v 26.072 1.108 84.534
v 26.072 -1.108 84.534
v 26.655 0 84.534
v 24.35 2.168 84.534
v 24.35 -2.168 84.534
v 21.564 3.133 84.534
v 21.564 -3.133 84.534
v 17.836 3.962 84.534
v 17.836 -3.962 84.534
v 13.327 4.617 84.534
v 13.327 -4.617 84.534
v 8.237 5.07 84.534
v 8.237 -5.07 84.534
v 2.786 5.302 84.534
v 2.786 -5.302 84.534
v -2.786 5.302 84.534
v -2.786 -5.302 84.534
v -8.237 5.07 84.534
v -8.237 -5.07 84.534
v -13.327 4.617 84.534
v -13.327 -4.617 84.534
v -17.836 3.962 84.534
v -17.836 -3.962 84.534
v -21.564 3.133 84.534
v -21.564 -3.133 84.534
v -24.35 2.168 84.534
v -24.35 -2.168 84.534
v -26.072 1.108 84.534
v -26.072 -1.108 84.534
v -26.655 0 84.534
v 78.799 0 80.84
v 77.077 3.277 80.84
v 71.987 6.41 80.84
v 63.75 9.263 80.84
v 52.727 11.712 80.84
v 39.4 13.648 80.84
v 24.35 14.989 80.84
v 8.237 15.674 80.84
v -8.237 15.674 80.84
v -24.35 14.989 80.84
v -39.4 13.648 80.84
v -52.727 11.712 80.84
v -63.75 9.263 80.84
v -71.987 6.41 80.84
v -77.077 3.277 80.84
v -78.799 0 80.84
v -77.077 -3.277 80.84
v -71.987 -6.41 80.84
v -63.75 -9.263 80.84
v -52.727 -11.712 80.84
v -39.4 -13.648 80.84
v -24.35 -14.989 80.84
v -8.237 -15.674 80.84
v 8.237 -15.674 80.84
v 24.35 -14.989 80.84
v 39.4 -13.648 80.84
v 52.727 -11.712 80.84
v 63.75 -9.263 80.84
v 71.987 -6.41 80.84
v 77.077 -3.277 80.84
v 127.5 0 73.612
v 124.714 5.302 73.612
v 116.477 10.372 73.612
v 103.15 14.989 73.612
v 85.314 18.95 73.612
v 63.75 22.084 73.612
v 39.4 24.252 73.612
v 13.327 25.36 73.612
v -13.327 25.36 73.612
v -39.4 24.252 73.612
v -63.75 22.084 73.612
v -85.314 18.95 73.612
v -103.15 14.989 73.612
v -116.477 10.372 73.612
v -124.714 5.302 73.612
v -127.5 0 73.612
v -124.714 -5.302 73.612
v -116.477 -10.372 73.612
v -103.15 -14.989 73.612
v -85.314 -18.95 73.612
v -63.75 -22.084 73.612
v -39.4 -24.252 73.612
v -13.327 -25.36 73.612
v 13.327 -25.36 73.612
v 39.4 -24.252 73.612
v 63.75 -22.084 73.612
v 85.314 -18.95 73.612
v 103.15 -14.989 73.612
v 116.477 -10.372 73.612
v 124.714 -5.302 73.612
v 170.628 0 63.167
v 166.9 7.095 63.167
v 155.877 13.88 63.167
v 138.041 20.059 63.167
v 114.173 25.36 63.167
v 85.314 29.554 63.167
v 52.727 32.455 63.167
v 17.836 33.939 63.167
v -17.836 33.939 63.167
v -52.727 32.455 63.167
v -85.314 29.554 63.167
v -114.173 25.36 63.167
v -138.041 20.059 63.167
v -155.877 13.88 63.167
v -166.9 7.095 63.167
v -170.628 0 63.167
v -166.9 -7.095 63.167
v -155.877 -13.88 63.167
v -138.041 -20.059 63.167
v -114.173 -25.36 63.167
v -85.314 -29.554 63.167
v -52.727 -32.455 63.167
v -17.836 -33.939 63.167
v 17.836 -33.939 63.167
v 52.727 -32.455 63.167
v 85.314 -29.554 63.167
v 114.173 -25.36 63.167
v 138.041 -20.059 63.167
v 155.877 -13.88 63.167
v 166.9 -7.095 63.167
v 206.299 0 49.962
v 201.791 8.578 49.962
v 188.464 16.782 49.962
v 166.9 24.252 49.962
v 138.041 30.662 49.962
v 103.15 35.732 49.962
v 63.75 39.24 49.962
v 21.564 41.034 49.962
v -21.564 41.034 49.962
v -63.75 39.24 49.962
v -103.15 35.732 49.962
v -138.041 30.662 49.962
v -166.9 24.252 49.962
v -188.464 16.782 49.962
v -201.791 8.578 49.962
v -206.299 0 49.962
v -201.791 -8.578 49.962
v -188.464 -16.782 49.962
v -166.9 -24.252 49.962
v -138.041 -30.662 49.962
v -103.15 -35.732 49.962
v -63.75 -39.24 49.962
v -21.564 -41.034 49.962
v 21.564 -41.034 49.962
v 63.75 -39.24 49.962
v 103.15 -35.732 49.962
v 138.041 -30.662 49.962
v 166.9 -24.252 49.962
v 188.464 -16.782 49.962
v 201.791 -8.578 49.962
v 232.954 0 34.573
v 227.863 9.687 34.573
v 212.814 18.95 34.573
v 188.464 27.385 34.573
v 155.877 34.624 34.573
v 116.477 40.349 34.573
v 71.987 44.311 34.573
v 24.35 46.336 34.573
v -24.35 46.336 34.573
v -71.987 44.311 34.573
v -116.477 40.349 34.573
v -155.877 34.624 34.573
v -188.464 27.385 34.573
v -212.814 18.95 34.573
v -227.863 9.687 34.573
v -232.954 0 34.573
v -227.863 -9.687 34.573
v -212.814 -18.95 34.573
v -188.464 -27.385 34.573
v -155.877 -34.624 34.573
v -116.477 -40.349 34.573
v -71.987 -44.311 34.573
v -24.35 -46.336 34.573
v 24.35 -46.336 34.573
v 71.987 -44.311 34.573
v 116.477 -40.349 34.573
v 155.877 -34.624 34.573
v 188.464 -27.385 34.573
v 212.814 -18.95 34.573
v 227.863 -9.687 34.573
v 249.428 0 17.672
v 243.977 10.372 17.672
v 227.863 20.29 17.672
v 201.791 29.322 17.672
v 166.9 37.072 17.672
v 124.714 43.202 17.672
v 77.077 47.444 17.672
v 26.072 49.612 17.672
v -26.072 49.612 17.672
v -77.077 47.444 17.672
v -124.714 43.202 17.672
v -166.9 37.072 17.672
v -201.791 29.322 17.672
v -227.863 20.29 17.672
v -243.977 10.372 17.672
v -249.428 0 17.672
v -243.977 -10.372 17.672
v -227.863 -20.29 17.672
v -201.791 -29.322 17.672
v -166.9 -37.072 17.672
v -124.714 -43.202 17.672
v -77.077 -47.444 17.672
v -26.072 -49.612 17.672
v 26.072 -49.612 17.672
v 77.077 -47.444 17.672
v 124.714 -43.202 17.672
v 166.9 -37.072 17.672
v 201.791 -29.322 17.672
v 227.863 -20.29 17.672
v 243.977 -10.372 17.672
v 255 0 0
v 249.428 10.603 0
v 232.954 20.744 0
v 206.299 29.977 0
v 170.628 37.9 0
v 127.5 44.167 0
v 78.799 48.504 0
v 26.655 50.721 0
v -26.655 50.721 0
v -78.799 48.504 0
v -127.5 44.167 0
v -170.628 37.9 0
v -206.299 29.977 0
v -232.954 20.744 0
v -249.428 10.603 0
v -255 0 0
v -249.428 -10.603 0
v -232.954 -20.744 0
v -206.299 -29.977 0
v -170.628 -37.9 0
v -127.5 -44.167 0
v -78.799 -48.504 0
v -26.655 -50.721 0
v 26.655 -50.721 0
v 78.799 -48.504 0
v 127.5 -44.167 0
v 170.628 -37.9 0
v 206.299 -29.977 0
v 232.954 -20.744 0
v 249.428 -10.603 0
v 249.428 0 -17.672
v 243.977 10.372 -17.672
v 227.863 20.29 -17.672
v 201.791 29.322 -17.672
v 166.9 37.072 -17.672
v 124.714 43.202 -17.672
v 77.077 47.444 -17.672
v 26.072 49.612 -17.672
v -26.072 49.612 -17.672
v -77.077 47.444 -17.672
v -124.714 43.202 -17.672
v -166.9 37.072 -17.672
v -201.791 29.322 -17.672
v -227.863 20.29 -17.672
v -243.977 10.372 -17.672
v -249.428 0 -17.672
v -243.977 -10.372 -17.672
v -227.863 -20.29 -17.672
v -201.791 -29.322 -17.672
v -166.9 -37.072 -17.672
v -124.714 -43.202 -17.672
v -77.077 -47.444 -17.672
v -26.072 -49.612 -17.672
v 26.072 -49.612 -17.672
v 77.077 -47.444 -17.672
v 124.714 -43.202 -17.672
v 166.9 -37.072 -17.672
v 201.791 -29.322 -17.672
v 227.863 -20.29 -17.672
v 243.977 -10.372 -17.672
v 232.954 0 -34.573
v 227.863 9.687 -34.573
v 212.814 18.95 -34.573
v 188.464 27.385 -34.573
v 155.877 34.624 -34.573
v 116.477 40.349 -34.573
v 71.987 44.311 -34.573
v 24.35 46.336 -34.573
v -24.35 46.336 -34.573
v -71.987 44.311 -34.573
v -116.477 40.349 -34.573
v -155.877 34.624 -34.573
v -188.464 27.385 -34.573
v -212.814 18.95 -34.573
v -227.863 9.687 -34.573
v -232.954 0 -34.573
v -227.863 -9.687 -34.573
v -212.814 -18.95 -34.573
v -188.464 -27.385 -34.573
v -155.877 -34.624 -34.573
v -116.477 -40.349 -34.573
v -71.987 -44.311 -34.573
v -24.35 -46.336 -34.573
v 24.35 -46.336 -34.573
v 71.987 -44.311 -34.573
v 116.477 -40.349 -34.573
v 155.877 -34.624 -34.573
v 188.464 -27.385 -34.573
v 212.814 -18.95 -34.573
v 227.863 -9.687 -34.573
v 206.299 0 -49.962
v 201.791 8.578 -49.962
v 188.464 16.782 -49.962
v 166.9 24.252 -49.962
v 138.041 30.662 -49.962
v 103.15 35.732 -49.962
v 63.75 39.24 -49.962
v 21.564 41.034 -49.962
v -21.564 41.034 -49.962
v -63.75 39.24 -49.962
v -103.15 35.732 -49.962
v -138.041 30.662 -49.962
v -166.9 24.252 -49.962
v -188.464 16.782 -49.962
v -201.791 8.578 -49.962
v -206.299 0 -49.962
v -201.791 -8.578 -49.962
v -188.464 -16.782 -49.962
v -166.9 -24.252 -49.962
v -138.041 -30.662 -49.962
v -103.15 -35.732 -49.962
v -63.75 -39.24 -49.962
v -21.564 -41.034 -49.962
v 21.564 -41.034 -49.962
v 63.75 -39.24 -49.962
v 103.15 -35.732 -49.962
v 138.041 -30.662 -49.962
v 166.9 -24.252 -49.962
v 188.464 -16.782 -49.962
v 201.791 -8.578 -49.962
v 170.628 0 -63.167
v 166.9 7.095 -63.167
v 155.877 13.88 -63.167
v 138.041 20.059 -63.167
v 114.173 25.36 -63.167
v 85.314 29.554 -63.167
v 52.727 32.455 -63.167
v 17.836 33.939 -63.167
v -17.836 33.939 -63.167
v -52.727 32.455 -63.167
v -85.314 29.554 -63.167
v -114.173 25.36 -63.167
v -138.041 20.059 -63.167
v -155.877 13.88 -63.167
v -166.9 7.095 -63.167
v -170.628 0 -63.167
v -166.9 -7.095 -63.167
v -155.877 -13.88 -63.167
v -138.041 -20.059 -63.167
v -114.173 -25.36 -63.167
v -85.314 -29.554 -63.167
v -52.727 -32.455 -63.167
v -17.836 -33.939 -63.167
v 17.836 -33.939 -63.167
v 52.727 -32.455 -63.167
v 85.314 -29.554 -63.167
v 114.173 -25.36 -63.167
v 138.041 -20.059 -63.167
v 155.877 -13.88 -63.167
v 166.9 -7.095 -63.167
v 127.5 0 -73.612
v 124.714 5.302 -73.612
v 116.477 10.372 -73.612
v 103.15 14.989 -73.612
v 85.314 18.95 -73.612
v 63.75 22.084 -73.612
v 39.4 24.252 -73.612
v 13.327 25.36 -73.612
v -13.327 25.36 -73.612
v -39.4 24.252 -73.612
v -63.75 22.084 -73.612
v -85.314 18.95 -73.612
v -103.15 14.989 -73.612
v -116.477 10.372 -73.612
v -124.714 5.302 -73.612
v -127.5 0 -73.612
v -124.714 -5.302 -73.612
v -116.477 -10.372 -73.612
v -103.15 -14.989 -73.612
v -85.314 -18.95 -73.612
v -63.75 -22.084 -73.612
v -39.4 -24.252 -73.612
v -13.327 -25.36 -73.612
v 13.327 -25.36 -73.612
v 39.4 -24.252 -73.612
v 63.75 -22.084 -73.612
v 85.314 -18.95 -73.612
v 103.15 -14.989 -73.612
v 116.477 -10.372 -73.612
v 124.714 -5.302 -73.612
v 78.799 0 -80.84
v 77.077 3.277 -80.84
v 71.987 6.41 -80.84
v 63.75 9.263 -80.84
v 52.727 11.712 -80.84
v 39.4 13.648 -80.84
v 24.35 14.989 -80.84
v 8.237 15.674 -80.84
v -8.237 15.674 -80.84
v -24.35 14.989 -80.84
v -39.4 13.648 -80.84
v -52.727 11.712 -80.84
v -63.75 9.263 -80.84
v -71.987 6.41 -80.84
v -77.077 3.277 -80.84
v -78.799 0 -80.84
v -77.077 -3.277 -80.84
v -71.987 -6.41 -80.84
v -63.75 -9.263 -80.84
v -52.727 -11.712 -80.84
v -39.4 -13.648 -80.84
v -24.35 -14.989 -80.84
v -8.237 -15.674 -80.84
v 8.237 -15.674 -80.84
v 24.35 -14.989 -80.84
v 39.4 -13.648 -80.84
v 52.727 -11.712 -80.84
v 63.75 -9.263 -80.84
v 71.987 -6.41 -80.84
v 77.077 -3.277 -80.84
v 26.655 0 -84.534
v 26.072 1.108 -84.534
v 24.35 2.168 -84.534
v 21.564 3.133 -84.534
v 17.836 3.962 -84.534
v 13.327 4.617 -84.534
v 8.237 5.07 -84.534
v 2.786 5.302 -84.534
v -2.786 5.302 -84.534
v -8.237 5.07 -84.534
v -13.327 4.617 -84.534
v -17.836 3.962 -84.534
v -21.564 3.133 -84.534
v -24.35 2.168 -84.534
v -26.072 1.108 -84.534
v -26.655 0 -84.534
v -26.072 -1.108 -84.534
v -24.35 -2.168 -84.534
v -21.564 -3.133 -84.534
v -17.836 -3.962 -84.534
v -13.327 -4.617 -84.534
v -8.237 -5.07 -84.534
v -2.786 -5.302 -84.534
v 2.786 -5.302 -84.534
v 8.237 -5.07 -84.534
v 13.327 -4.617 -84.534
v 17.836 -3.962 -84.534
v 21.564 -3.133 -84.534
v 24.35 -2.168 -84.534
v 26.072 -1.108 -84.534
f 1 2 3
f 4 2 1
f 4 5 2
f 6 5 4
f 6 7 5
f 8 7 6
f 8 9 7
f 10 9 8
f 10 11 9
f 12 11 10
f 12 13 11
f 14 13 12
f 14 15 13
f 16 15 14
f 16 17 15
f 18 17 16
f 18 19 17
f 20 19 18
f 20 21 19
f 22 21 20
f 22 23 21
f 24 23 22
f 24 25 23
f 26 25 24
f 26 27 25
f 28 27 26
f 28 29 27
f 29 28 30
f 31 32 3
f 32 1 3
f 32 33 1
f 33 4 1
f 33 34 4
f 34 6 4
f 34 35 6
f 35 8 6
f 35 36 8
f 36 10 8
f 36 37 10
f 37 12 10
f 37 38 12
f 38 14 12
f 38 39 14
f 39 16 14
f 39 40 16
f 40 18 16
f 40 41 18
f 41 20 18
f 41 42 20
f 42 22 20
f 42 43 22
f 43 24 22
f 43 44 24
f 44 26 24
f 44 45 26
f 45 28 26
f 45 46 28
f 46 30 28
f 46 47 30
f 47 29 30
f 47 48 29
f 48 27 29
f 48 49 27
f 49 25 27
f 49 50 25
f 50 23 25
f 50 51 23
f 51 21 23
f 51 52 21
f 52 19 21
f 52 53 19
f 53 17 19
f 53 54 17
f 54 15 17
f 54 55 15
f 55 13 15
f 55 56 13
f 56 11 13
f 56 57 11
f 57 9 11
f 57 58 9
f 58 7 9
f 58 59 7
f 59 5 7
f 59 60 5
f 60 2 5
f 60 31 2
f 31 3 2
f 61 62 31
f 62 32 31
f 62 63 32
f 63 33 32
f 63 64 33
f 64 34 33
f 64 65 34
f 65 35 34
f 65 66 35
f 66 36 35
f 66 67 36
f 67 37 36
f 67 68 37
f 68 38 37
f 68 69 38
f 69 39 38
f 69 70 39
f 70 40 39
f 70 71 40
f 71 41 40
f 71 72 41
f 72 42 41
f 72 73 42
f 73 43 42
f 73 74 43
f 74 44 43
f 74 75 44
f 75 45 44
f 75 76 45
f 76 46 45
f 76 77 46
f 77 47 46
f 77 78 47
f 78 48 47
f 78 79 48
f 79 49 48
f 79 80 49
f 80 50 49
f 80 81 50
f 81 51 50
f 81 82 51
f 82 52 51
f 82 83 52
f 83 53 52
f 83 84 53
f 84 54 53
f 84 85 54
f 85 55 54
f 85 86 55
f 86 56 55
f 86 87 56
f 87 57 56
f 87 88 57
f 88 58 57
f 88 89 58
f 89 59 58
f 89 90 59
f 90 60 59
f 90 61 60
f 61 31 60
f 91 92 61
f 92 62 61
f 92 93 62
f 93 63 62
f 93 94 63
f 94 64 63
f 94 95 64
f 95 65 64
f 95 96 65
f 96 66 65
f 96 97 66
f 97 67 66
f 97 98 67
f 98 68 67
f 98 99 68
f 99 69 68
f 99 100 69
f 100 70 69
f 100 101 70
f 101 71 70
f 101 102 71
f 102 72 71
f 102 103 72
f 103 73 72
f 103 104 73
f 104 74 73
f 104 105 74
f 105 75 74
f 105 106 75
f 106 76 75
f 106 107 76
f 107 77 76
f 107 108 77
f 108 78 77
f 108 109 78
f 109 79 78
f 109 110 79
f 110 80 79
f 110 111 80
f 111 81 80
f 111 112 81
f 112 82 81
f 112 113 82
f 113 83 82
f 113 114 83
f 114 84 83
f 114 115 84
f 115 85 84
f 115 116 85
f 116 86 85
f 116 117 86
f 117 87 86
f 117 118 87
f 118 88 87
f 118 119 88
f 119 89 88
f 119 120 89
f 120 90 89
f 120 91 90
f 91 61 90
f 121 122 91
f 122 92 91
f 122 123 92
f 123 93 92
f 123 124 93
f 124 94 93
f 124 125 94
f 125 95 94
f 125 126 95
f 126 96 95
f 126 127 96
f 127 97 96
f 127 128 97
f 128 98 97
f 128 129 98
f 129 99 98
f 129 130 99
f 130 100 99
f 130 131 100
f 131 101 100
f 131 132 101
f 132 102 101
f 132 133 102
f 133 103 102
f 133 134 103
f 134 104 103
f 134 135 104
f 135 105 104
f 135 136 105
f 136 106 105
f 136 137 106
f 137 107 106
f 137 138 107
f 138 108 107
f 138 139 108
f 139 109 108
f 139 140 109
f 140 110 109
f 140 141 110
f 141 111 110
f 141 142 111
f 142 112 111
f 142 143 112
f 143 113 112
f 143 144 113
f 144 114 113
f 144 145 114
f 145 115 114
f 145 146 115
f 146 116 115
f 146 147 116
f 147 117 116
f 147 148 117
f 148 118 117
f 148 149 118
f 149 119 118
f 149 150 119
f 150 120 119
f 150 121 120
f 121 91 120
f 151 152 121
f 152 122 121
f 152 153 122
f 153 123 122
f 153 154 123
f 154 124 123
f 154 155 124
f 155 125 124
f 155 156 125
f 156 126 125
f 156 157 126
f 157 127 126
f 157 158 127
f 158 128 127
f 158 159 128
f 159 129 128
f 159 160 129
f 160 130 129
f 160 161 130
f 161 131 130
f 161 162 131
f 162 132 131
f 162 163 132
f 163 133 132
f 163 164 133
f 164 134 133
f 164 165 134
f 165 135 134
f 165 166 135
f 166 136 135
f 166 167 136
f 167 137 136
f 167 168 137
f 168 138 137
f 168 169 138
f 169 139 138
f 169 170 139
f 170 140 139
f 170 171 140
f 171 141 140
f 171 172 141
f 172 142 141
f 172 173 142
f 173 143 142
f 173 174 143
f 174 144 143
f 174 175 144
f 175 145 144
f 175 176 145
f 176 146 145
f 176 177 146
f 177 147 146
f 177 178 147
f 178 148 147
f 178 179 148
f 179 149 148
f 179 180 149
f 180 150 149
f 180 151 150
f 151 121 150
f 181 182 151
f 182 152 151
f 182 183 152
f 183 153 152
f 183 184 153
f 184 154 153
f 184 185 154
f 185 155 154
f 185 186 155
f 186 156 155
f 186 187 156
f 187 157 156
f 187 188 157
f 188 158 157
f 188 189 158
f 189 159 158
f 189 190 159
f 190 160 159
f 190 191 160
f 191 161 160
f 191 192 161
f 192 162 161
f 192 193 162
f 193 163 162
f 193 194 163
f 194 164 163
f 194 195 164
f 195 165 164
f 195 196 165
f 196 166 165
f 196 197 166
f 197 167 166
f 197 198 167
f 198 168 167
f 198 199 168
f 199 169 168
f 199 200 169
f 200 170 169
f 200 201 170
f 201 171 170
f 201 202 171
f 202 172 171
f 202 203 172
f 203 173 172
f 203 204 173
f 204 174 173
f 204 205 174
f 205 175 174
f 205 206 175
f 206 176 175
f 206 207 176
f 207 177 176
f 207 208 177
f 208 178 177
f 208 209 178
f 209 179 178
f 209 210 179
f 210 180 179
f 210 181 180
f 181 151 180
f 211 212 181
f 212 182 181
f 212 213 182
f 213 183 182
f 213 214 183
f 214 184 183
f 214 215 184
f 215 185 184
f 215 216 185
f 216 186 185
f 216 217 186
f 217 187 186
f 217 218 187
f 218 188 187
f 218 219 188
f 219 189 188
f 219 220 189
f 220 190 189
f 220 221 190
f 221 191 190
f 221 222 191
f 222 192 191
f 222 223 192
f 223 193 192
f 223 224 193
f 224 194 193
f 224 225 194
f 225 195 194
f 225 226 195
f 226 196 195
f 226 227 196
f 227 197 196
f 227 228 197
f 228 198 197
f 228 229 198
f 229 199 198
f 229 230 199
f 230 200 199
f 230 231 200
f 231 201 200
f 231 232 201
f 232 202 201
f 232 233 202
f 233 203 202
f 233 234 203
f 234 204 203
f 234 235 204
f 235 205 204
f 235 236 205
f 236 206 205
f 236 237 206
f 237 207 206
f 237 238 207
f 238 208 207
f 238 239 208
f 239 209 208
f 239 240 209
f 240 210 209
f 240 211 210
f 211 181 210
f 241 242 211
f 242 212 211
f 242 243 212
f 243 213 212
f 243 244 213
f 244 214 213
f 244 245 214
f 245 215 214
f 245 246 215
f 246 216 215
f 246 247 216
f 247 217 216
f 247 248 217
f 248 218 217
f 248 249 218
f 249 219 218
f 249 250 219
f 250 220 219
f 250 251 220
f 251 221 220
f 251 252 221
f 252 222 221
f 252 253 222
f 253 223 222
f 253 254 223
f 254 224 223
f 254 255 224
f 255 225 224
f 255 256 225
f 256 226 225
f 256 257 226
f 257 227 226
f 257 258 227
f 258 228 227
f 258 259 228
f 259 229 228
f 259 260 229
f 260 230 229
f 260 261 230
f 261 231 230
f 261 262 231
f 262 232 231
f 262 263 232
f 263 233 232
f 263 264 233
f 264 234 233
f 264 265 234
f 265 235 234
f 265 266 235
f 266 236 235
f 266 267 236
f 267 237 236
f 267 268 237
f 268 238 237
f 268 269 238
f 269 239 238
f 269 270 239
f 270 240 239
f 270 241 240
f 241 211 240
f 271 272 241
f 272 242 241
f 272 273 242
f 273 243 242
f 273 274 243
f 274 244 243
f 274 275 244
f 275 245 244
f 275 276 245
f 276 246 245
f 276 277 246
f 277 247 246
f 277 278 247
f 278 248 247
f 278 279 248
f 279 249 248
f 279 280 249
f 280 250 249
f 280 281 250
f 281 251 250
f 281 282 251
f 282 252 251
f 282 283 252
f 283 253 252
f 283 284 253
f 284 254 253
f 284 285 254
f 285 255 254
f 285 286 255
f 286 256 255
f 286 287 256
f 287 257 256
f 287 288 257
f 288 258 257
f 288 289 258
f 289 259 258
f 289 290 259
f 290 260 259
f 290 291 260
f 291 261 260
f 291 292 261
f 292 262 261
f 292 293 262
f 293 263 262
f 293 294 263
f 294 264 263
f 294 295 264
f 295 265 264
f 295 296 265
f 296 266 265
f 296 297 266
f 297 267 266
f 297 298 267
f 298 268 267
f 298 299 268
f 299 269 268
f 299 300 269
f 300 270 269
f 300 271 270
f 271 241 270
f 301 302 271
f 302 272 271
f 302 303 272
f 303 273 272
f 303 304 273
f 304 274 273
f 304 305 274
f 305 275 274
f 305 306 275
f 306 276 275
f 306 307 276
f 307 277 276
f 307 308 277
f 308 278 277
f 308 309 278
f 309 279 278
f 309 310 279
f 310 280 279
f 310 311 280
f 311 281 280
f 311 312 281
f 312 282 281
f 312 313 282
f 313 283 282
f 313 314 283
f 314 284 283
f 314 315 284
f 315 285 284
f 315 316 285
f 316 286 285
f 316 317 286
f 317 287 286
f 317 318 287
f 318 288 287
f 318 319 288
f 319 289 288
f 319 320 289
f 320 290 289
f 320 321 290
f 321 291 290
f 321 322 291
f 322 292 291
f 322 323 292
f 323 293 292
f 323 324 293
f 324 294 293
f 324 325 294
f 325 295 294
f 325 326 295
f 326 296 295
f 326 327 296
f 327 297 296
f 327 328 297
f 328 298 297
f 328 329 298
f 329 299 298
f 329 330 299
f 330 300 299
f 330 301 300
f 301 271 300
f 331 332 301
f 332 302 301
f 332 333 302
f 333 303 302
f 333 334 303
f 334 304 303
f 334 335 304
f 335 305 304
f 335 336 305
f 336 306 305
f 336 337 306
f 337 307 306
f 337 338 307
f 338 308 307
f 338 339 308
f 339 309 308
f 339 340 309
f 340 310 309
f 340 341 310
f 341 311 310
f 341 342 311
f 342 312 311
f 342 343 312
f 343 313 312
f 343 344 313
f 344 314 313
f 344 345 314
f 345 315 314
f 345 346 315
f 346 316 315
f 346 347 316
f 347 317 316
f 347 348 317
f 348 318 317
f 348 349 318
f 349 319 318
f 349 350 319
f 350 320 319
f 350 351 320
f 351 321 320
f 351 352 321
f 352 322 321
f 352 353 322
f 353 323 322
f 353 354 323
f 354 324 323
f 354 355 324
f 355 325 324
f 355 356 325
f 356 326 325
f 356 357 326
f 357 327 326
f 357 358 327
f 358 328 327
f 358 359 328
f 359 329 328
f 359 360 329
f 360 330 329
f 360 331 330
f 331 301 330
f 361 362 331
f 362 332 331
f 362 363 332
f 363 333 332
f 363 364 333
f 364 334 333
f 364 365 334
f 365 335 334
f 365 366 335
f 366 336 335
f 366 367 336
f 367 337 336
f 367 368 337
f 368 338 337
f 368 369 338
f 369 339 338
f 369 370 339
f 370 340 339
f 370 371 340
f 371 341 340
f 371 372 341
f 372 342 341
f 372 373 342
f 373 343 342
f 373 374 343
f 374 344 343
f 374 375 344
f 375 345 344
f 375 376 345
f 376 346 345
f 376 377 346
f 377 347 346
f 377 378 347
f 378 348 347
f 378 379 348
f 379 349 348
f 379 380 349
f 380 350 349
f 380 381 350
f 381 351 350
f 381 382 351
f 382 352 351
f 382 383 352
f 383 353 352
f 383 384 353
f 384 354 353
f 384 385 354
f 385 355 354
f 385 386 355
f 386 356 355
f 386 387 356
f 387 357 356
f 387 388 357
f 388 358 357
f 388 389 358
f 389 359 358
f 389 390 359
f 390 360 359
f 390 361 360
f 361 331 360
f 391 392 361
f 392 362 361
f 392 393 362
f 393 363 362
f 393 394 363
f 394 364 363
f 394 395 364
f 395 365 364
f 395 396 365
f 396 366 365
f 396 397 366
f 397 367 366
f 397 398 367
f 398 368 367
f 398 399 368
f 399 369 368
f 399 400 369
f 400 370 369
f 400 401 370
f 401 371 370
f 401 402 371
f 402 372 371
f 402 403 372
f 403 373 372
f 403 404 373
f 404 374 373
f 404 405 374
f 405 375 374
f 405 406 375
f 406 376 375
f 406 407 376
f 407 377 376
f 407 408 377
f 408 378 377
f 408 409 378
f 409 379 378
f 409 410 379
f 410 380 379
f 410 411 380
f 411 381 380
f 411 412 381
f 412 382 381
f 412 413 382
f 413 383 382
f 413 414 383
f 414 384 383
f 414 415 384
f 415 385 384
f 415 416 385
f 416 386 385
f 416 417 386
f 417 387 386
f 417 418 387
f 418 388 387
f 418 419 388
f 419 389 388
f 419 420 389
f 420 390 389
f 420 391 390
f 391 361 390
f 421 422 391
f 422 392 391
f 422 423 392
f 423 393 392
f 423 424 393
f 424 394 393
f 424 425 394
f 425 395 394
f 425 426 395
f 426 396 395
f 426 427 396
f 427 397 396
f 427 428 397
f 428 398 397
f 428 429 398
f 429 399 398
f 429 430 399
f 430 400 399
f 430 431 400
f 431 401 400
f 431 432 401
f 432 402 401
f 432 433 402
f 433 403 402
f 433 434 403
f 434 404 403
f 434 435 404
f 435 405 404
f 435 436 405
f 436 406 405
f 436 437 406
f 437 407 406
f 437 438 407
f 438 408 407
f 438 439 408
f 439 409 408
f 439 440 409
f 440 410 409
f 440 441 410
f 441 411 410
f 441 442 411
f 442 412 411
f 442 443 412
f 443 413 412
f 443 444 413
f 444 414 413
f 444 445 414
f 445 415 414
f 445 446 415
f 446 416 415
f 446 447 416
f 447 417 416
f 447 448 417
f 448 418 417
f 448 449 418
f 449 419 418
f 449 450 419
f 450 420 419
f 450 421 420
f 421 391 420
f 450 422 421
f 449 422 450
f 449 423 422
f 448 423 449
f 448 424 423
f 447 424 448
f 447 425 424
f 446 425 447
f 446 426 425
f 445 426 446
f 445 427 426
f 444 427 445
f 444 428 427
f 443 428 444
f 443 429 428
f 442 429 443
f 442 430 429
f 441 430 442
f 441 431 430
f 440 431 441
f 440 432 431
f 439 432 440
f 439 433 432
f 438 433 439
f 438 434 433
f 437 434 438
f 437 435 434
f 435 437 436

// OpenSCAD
// Generated by SolidPython 1.0.1 on 2020-07-29 00:46:51


scale(v = [15, 3, 5]) {
	sphere(r = 17);
}
/***********************************************
*********      SolidPython code:      **********
************************************************
 
# import packages: SolidPython
from solid import *
from solid.utils import *
from itertools import chain, combinations, permutations


class Resize:

    def __init__(self, scad_file):
        self.scad_file = scad_file
        #self.scad_file = import_scad(scad_file)
        # cone/cylinder param:
        self.r1 = 0
        self.r2 = 0
        self.h = 0
        # rectangular prism param:
        self.w = 0
        self.l = 0
        # ellipse param:
        self.r = 0

    # import OpenScad code (file name corresponds to shape)


    # classify shape + parameters
    def assign(self, param1, param2, param3):
        if self.scad_file == 'cone.scad':
            self.r1 = param1
            self.r2 = param2
            self.h = param3
        elif self.scad_file == 'cylinder.scad':
            self.r1 = param1
            self.r2 = param2
            self.h = param3
        elif self.scad_file == 'rectangularPrism.scad':
            self.h = param1
            self.l = param2
            self.w = param3
        else:
            self.r = param1
            self.h = param2

    # resize parameters
    def iterate(self):
        x = range(3, 20, 2)
        i = 1
        if self.scad_file == 'cone.scad':
            tempList = list(permutations(x, 2))
            for temp in tempList:
                param1 = temp[0]
                param2 = temp[1]
                filepath = 'produced_scad_files/' + 'cone' + str(param1) + '_' + str(param2) + '_' + '.scad'
                scad_render_to_file(cylinder(h=param1, r1=param2, r2=0), filepath)

        elif self.scad_file == 'cylinder.scad':
            tempList = list(permutations(x, 3))
            for temp in tempList:
                param1 = temp[0]
                param2 = temp[1]
                filepath = 'produced_scad_files/' + 'cylinder' + str(param1) + '_' + str(param2) + '_' + '.scad'
                scad_render_to_file(cylinder(h=param1, r1=param2, r2=param2), filepath)

        elif self.scad_file == 'rectangularPrism.scad':
            tempList = list(permutations(x, 3))
            for temp in tempList:
                param1 = temp[0]
                param2 = temp[1]
                param3 = temp[2]
                filepath = 'produced_scad_files/' + 'rectangularPrism' + str(param1) + '_' + str(param2) + '_' + str(
                    param3) + '.scad'
                scad_render_to_file(cube(size=(param1, param2, param3)), filepath)

        elif self.scad_file == 'ellipse.scad':
            tempList = list(permutations(x, 4))
            for temp in tempList:
                param1 = temp[0]
                param2 = temp[1]
                param3 = temp[2]
                param4 = temp[3]
                filepath = 'produced_scad_files/' + 'ellipse' + str(param1) + '_' + str(param2) + '_' + str(param3) + '_' + str(param4) + '.scad'
                scad_render_to_file(scale([param1, param2, param3])(sphere(r=param4)), filepath)

    def render_to_scadfile(self):
        scad_render_to_file(scad, 'example.scad') 
 
************************************************/
